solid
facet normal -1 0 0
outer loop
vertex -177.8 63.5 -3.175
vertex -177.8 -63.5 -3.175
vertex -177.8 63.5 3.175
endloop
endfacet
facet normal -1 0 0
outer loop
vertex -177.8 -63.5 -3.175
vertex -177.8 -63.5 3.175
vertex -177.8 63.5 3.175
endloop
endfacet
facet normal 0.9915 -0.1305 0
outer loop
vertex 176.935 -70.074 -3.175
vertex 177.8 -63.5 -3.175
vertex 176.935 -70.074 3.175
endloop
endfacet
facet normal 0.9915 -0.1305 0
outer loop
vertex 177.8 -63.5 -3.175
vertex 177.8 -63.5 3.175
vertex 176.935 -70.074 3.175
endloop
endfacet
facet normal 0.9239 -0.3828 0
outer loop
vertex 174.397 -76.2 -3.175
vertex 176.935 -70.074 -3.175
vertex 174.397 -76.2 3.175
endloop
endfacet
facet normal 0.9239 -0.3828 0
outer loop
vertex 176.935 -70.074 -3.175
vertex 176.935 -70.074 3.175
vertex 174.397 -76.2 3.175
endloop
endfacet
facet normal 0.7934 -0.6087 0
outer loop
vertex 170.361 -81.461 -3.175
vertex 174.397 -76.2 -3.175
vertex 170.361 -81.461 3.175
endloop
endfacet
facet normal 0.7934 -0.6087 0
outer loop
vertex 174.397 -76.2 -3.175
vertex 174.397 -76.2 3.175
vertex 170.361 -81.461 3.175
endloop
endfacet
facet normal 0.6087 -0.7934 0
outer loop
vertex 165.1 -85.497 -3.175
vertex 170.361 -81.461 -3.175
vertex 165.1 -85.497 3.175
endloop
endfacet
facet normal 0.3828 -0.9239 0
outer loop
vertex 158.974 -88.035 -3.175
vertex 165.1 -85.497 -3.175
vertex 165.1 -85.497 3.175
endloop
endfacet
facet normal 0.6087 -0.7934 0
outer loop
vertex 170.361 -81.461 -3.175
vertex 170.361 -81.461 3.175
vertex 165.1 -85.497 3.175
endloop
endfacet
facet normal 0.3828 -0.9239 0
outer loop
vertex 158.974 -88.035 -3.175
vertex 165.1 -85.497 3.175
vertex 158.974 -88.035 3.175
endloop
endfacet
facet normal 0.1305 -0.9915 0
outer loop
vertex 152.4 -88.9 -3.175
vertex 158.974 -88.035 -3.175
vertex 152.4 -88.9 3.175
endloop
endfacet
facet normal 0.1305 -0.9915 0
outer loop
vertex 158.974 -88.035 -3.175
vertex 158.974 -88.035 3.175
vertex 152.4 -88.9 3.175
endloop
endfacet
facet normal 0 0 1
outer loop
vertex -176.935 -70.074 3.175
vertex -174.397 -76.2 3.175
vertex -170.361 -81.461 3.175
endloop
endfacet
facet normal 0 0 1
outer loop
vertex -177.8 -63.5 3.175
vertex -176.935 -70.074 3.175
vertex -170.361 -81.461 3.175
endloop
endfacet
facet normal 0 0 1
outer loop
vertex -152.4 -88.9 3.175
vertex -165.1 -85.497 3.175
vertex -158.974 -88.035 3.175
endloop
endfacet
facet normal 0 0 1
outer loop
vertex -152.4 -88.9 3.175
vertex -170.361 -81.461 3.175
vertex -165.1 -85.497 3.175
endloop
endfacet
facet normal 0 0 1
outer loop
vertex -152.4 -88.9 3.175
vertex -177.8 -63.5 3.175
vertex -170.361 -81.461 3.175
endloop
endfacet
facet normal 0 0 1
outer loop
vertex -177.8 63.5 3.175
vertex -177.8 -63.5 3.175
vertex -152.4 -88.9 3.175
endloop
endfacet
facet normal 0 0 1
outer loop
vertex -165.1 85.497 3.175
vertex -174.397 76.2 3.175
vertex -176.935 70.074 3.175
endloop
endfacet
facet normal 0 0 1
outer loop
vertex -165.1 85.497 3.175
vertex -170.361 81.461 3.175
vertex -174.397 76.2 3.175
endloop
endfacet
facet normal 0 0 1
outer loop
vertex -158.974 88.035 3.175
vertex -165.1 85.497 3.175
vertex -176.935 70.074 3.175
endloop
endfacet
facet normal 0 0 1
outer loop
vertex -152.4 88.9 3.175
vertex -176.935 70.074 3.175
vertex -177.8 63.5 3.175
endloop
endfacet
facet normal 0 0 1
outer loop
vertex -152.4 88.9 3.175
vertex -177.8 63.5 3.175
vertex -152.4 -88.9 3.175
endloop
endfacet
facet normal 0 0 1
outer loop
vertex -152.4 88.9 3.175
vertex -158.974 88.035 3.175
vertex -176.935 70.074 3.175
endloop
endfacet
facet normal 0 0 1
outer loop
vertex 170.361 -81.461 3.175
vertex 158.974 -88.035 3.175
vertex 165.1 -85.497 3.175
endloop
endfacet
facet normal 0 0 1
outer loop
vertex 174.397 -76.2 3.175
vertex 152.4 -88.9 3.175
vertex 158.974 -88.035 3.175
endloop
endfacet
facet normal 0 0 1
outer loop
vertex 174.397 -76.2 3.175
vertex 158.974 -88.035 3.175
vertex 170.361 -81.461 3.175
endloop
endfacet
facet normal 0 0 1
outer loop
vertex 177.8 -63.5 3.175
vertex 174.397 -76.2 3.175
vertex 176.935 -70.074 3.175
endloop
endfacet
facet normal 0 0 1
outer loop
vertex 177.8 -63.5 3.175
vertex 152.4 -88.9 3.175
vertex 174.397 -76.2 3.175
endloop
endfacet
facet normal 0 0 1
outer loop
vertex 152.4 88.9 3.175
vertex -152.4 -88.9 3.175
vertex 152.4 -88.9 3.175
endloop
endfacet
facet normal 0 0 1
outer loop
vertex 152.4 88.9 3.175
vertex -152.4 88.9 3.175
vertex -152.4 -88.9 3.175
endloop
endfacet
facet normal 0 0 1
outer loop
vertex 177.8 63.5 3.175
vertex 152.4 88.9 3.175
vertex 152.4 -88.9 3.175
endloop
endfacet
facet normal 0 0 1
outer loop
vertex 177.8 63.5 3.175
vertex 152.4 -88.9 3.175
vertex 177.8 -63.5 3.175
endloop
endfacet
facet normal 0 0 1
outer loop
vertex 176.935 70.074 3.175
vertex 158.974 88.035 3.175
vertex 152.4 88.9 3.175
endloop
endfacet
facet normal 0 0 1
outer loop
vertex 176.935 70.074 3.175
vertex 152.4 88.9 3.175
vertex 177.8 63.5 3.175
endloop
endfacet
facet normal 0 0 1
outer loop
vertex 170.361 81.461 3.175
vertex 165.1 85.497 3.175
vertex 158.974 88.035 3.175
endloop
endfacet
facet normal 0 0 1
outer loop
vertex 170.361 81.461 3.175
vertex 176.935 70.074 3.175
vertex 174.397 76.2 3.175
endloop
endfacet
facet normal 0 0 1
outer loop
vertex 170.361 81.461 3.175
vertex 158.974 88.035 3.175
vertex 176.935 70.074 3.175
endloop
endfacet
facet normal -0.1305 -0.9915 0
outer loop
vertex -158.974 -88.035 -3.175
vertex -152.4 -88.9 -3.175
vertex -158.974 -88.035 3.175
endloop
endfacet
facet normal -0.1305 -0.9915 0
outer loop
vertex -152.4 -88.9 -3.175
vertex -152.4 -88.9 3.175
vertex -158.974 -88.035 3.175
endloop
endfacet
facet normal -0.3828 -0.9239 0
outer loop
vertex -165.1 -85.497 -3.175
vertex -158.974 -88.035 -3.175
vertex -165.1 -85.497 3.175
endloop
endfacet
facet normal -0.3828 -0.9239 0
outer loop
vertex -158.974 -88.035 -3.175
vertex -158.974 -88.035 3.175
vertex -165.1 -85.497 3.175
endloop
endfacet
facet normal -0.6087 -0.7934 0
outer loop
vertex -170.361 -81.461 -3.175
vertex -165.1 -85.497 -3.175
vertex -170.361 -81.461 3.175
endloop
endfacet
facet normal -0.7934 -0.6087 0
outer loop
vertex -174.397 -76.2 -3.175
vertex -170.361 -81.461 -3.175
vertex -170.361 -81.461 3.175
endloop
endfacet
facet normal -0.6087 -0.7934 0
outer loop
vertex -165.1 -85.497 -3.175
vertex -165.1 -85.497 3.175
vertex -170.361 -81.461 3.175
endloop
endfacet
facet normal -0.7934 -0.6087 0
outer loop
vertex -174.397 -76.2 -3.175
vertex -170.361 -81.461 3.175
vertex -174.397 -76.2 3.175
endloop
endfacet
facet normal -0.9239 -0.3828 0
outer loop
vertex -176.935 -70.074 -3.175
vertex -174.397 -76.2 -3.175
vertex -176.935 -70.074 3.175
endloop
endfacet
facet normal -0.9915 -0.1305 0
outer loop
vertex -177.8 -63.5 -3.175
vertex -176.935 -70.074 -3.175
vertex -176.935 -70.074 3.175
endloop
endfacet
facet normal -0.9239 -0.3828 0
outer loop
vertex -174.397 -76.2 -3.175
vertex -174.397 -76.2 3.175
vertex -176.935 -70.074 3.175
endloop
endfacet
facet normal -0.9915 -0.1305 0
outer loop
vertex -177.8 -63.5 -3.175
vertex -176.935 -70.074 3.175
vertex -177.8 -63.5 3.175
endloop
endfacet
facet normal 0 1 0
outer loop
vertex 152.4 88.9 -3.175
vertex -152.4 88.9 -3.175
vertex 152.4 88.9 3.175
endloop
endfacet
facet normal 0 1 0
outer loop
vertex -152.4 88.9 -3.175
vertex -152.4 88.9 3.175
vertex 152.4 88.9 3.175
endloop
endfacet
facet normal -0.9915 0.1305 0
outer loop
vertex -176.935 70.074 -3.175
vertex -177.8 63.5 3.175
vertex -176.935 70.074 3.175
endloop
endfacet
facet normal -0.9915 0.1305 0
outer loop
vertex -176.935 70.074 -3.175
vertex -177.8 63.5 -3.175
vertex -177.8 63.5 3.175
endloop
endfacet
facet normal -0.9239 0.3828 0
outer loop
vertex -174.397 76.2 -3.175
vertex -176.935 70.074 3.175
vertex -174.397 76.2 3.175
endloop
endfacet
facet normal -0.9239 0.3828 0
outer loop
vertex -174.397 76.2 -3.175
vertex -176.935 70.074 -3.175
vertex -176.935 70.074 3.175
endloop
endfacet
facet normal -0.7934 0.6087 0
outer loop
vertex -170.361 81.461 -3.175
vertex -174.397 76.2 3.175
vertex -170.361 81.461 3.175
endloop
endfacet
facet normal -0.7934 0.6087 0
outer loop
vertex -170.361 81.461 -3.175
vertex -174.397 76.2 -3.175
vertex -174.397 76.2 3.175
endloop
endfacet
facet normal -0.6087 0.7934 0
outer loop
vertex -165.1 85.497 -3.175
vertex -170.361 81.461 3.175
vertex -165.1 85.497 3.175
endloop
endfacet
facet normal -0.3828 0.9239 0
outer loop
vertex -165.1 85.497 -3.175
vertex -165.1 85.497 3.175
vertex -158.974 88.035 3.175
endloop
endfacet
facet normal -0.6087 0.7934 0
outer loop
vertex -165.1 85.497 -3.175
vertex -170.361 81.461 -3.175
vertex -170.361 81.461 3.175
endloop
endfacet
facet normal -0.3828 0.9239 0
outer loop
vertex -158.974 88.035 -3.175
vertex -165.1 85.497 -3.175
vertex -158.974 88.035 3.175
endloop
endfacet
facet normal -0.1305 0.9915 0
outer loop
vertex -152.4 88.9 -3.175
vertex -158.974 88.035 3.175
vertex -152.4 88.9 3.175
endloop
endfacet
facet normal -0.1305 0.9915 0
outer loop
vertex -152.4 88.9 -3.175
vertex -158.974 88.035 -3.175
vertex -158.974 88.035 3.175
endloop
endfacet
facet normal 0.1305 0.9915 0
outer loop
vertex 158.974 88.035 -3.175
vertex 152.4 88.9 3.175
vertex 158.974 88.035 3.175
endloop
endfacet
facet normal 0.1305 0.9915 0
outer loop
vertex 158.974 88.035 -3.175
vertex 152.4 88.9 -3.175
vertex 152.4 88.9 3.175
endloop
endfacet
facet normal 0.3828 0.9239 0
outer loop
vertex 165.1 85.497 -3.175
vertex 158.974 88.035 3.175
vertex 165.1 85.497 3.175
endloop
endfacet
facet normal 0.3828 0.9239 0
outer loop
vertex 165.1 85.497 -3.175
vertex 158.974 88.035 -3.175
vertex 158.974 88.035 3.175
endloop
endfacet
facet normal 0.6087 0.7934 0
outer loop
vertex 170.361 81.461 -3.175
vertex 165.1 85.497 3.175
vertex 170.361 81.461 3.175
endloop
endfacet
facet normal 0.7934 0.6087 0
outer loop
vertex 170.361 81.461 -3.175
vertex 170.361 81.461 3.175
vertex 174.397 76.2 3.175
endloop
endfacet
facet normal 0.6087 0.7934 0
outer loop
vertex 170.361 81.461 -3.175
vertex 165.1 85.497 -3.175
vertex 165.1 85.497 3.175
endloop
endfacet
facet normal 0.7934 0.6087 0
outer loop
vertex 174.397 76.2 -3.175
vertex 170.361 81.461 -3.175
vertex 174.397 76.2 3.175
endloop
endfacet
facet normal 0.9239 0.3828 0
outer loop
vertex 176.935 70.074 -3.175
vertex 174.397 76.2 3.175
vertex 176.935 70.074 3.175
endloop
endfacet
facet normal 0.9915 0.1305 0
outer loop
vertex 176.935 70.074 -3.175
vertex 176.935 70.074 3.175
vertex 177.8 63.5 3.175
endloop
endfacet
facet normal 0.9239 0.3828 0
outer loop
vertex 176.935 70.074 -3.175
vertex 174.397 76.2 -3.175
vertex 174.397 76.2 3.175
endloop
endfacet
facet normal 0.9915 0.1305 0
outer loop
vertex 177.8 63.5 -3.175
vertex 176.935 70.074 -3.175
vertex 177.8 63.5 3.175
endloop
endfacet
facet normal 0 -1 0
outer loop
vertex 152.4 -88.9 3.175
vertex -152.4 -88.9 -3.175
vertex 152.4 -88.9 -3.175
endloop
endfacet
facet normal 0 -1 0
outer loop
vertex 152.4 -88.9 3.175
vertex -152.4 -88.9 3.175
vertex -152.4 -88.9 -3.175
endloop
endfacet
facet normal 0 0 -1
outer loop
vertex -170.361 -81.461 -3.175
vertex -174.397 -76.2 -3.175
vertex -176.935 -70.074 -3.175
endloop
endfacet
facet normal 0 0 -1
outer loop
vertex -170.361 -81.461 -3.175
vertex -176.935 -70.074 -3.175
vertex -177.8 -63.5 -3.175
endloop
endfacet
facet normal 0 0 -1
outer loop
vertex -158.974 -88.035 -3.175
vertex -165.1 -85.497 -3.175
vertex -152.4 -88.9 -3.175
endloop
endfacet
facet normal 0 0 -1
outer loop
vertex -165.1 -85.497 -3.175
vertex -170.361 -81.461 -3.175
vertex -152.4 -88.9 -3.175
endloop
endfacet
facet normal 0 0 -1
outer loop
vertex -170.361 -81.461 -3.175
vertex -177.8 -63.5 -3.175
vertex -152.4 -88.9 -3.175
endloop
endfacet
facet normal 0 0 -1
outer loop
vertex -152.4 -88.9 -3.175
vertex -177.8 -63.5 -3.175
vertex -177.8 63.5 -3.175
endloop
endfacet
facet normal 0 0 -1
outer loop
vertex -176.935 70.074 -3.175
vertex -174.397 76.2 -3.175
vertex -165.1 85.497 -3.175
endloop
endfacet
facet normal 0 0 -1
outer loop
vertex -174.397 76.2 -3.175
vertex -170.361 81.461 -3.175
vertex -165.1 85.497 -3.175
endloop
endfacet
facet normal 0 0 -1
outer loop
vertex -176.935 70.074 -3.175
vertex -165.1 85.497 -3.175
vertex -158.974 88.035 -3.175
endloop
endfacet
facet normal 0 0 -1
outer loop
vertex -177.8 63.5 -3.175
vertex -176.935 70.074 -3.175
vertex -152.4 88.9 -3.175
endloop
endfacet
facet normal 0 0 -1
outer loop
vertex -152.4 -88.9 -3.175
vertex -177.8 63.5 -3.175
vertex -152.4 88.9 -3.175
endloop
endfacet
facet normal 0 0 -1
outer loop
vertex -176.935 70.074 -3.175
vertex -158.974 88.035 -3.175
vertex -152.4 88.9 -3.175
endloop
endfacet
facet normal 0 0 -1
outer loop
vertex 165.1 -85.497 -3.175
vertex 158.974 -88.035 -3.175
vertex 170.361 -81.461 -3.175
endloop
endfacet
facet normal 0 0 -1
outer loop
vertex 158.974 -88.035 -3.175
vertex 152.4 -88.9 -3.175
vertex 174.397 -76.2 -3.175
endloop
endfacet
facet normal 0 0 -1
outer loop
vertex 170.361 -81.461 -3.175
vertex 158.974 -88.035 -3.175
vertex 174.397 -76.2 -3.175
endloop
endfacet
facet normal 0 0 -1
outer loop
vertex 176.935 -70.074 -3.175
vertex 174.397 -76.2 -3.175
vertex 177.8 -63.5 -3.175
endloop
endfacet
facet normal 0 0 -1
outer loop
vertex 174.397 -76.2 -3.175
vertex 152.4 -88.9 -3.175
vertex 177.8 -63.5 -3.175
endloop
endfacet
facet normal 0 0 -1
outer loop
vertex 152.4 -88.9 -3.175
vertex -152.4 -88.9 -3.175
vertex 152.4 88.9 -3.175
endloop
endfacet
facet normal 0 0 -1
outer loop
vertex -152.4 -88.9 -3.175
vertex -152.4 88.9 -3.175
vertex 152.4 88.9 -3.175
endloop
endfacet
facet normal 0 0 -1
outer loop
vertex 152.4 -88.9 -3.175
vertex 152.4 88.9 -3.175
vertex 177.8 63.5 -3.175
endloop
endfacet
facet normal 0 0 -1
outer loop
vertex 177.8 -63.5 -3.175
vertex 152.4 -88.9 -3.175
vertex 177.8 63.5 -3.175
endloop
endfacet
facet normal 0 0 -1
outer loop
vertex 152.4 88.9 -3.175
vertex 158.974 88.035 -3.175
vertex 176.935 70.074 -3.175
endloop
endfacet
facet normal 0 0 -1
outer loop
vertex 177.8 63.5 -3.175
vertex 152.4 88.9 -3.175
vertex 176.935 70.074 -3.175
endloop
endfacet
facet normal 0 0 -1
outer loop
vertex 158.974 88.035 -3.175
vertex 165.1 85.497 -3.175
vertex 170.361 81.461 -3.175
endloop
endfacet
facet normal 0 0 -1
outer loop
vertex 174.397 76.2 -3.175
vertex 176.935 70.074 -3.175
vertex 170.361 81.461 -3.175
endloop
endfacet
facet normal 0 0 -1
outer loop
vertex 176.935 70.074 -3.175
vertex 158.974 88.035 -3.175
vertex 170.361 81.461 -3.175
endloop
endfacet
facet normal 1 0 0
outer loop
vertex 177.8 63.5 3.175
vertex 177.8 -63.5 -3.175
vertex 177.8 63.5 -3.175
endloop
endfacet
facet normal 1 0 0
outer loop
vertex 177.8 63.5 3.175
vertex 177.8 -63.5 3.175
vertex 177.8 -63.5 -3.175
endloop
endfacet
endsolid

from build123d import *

# Parameters (mm, degrees)
F0_W     = 304.8
F0_H     = 125.8824
F1_DEPTH = 3.175
F2_W     = 355.6
F2_H     = 177.8
F3_DEPTH = 3.175
F4_R     = 25.4
F5_R     = 25.4
F6_R     = 25.4
F7_R     = 25.4


with BuildPart() as f1:
    # F0 (on Top) → F1 (new body, symmetric)
    with BuildSketch(Plane.XY):
        Rectangle(F0_W, F0_H)
    extrude(amount=F1_DEPTH, both=True)

    # F2 (on Top) → F3 (join, symmetric)
    with BuildSketch(Plane.XY):
        Rectangle(F2_W, F2_H)
    extrude(amount=F3_DEPTH, both=True)

    # F4
    f4_edges = [f1.edges().sort_by_distance(p)[0] for p in [
        (-177.8, 88.9, 0),
    ]]
    fillet(f4_edges, radius=F4_R)

    # F5
    f5_edges = [f1.edges().sort_by_distance(p)[0] for p in [
        (177.8, 88.9, 0),
    ]]
    fillet(f5_edges, radius=F5_R)

    # F6
    f6_edges = [f1.edges().sort_by_distance(p)[0] for p in [
        (177.8, -88.9, 0),
    ]]
    fillet(f6_edges, radius=F6_R)

    # F7
    f7_edges = [f1.edges().sort_by_distance(p)[0] for p in [
        (-177.8, -88.9, 0),
    ]]
    fillet(f7_edges, radius=F7_R)


solid = f1.part
